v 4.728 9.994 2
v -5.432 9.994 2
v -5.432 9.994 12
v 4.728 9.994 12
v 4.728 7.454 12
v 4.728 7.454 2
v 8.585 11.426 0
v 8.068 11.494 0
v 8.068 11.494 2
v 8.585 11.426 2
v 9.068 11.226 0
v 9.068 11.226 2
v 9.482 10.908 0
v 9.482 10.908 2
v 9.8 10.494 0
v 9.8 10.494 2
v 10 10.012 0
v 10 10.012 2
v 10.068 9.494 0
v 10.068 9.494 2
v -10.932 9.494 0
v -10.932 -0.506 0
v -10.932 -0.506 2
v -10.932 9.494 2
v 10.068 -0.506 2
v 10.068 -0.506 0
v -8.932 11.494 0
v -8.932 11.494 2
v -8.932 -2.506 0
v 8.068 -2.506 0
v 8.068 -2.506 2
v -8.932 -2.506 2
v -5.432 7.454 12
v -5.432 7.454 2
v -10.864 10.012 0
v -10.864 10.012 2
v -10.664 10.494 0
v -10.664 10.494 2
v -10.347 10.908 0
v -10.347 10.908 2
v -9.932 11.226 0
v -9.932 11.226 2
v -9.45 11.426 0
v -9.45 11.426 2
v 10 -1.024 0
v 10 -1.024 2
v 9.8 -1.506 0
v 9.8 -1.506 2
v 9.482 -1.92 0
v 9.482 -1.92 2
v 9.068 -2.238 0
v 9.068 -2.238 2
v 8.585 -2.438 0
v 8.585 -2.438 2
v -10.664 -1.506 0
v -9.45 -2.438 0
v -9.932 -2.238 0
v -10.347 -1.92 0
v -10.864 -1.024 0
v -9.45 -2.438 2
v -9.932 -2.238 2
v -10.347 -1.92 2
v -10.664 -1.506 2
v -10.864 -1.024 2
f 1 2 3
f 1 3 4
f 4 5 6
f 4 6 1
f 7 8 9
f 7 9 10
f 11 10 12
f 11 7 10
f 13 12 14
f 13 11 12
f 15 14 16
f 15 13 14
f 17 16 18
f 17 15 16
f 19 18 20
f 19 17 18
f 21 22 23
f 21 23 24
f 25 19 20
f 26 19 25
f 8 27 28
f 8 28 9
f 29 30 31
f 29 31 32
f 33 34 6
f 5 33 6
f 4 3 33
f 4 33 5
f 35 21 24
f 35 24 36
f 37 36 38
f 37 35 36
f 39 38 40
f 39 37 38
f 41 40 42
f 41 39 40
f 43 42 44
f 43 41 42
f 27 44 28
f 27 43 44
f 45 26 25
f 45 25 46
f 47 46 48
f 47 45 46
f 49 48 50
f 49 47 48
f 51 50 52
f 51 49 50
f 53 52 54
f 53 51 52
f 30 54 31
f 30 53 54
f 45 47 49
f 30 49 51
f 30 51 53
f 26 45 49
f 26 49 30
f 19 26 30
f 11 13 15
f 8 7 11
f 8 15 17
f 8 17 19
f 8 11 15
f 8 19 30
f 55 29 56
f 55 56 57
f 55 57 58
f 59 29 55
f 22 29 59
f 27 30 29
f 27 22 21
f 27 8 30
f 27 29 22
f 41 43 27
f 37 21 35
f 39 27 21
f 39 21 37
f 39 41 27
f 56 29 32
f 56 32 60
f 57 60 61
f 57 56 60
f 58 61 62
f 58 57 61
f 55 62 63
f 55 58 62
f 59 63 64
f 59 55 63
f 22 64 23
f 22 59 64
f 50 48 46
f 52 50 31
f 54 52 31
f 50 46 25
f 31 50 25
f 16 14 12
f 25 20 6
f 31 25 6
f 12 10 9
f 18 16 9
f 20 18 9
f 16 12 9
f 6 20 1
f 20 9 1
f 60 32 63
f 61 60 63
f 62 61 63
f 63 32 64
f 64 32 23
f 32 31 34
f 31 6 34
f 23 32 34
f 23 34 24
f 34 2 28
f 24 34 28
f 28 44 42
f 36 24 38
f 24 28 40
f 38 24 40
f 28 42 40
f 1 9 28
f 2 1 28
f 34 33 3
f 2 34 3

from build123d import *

# Parameters (mm, degrees)
DODANIE_WYCI_GNI_CIE1_DEPTH = 2
SZKIC2_W                    = 10.16
SZKIC2_H                    = 2.54
DODANIE_WYCI_GNI_CIE2_DEPTH = 10


with BuildPart() as part:
    # Szkic1 → Dodanie-wyciągnięcie1 (new body)
    with BuildSketch(Plane.XY):
        with BuildLine():
            Line((-8.932319644, 11.49408284), (8.067680356, 11.49408284))
            ThreePointArc((8.067680356, 11.49408284), (9.481893919, 10.908296403), (10.067680356, 9.49408284))
            Line((10.067680356, 9.49408284), (10.067680356, -0.50591716))
            ThreePointArc((10.067680356, -0.50591716), (9.481893919, -1.920130722), (8.067680356, -2.50591716))
            Line((8.067680356, -2.50591716), (-8.932319644, -2.50591716))
            ThreePointArc((-8.932319644, -2.50591716), (-10.346533206, -1.920130722), (-10.932319644, -0.50591716))
            Line((-10.932319644, -0.50591716), (-10.932319644, 9.49408284))
            ThreePointArc((-10.932319644, 9.49408284), (-10.346533206, 10.908296403), (-8.932319644, 11.49408284))
        make_face()
    extrude(amount=DODANIE_WYCI_GNI_CIE1_DEPTH)

    # Szkic2 → Dodanie-wyciągnięcie2 (add)
    with BuildSketch(Plane.XY.offset(2)):
        with Locations((-0.352319644, 8.72408284)):
            Rectangle(SZKIC2_W, SZKIC2_H)
    extrude(amount=DODANIE_WYCI_GNI_CIE2_DEPTH)


solid = part.part
